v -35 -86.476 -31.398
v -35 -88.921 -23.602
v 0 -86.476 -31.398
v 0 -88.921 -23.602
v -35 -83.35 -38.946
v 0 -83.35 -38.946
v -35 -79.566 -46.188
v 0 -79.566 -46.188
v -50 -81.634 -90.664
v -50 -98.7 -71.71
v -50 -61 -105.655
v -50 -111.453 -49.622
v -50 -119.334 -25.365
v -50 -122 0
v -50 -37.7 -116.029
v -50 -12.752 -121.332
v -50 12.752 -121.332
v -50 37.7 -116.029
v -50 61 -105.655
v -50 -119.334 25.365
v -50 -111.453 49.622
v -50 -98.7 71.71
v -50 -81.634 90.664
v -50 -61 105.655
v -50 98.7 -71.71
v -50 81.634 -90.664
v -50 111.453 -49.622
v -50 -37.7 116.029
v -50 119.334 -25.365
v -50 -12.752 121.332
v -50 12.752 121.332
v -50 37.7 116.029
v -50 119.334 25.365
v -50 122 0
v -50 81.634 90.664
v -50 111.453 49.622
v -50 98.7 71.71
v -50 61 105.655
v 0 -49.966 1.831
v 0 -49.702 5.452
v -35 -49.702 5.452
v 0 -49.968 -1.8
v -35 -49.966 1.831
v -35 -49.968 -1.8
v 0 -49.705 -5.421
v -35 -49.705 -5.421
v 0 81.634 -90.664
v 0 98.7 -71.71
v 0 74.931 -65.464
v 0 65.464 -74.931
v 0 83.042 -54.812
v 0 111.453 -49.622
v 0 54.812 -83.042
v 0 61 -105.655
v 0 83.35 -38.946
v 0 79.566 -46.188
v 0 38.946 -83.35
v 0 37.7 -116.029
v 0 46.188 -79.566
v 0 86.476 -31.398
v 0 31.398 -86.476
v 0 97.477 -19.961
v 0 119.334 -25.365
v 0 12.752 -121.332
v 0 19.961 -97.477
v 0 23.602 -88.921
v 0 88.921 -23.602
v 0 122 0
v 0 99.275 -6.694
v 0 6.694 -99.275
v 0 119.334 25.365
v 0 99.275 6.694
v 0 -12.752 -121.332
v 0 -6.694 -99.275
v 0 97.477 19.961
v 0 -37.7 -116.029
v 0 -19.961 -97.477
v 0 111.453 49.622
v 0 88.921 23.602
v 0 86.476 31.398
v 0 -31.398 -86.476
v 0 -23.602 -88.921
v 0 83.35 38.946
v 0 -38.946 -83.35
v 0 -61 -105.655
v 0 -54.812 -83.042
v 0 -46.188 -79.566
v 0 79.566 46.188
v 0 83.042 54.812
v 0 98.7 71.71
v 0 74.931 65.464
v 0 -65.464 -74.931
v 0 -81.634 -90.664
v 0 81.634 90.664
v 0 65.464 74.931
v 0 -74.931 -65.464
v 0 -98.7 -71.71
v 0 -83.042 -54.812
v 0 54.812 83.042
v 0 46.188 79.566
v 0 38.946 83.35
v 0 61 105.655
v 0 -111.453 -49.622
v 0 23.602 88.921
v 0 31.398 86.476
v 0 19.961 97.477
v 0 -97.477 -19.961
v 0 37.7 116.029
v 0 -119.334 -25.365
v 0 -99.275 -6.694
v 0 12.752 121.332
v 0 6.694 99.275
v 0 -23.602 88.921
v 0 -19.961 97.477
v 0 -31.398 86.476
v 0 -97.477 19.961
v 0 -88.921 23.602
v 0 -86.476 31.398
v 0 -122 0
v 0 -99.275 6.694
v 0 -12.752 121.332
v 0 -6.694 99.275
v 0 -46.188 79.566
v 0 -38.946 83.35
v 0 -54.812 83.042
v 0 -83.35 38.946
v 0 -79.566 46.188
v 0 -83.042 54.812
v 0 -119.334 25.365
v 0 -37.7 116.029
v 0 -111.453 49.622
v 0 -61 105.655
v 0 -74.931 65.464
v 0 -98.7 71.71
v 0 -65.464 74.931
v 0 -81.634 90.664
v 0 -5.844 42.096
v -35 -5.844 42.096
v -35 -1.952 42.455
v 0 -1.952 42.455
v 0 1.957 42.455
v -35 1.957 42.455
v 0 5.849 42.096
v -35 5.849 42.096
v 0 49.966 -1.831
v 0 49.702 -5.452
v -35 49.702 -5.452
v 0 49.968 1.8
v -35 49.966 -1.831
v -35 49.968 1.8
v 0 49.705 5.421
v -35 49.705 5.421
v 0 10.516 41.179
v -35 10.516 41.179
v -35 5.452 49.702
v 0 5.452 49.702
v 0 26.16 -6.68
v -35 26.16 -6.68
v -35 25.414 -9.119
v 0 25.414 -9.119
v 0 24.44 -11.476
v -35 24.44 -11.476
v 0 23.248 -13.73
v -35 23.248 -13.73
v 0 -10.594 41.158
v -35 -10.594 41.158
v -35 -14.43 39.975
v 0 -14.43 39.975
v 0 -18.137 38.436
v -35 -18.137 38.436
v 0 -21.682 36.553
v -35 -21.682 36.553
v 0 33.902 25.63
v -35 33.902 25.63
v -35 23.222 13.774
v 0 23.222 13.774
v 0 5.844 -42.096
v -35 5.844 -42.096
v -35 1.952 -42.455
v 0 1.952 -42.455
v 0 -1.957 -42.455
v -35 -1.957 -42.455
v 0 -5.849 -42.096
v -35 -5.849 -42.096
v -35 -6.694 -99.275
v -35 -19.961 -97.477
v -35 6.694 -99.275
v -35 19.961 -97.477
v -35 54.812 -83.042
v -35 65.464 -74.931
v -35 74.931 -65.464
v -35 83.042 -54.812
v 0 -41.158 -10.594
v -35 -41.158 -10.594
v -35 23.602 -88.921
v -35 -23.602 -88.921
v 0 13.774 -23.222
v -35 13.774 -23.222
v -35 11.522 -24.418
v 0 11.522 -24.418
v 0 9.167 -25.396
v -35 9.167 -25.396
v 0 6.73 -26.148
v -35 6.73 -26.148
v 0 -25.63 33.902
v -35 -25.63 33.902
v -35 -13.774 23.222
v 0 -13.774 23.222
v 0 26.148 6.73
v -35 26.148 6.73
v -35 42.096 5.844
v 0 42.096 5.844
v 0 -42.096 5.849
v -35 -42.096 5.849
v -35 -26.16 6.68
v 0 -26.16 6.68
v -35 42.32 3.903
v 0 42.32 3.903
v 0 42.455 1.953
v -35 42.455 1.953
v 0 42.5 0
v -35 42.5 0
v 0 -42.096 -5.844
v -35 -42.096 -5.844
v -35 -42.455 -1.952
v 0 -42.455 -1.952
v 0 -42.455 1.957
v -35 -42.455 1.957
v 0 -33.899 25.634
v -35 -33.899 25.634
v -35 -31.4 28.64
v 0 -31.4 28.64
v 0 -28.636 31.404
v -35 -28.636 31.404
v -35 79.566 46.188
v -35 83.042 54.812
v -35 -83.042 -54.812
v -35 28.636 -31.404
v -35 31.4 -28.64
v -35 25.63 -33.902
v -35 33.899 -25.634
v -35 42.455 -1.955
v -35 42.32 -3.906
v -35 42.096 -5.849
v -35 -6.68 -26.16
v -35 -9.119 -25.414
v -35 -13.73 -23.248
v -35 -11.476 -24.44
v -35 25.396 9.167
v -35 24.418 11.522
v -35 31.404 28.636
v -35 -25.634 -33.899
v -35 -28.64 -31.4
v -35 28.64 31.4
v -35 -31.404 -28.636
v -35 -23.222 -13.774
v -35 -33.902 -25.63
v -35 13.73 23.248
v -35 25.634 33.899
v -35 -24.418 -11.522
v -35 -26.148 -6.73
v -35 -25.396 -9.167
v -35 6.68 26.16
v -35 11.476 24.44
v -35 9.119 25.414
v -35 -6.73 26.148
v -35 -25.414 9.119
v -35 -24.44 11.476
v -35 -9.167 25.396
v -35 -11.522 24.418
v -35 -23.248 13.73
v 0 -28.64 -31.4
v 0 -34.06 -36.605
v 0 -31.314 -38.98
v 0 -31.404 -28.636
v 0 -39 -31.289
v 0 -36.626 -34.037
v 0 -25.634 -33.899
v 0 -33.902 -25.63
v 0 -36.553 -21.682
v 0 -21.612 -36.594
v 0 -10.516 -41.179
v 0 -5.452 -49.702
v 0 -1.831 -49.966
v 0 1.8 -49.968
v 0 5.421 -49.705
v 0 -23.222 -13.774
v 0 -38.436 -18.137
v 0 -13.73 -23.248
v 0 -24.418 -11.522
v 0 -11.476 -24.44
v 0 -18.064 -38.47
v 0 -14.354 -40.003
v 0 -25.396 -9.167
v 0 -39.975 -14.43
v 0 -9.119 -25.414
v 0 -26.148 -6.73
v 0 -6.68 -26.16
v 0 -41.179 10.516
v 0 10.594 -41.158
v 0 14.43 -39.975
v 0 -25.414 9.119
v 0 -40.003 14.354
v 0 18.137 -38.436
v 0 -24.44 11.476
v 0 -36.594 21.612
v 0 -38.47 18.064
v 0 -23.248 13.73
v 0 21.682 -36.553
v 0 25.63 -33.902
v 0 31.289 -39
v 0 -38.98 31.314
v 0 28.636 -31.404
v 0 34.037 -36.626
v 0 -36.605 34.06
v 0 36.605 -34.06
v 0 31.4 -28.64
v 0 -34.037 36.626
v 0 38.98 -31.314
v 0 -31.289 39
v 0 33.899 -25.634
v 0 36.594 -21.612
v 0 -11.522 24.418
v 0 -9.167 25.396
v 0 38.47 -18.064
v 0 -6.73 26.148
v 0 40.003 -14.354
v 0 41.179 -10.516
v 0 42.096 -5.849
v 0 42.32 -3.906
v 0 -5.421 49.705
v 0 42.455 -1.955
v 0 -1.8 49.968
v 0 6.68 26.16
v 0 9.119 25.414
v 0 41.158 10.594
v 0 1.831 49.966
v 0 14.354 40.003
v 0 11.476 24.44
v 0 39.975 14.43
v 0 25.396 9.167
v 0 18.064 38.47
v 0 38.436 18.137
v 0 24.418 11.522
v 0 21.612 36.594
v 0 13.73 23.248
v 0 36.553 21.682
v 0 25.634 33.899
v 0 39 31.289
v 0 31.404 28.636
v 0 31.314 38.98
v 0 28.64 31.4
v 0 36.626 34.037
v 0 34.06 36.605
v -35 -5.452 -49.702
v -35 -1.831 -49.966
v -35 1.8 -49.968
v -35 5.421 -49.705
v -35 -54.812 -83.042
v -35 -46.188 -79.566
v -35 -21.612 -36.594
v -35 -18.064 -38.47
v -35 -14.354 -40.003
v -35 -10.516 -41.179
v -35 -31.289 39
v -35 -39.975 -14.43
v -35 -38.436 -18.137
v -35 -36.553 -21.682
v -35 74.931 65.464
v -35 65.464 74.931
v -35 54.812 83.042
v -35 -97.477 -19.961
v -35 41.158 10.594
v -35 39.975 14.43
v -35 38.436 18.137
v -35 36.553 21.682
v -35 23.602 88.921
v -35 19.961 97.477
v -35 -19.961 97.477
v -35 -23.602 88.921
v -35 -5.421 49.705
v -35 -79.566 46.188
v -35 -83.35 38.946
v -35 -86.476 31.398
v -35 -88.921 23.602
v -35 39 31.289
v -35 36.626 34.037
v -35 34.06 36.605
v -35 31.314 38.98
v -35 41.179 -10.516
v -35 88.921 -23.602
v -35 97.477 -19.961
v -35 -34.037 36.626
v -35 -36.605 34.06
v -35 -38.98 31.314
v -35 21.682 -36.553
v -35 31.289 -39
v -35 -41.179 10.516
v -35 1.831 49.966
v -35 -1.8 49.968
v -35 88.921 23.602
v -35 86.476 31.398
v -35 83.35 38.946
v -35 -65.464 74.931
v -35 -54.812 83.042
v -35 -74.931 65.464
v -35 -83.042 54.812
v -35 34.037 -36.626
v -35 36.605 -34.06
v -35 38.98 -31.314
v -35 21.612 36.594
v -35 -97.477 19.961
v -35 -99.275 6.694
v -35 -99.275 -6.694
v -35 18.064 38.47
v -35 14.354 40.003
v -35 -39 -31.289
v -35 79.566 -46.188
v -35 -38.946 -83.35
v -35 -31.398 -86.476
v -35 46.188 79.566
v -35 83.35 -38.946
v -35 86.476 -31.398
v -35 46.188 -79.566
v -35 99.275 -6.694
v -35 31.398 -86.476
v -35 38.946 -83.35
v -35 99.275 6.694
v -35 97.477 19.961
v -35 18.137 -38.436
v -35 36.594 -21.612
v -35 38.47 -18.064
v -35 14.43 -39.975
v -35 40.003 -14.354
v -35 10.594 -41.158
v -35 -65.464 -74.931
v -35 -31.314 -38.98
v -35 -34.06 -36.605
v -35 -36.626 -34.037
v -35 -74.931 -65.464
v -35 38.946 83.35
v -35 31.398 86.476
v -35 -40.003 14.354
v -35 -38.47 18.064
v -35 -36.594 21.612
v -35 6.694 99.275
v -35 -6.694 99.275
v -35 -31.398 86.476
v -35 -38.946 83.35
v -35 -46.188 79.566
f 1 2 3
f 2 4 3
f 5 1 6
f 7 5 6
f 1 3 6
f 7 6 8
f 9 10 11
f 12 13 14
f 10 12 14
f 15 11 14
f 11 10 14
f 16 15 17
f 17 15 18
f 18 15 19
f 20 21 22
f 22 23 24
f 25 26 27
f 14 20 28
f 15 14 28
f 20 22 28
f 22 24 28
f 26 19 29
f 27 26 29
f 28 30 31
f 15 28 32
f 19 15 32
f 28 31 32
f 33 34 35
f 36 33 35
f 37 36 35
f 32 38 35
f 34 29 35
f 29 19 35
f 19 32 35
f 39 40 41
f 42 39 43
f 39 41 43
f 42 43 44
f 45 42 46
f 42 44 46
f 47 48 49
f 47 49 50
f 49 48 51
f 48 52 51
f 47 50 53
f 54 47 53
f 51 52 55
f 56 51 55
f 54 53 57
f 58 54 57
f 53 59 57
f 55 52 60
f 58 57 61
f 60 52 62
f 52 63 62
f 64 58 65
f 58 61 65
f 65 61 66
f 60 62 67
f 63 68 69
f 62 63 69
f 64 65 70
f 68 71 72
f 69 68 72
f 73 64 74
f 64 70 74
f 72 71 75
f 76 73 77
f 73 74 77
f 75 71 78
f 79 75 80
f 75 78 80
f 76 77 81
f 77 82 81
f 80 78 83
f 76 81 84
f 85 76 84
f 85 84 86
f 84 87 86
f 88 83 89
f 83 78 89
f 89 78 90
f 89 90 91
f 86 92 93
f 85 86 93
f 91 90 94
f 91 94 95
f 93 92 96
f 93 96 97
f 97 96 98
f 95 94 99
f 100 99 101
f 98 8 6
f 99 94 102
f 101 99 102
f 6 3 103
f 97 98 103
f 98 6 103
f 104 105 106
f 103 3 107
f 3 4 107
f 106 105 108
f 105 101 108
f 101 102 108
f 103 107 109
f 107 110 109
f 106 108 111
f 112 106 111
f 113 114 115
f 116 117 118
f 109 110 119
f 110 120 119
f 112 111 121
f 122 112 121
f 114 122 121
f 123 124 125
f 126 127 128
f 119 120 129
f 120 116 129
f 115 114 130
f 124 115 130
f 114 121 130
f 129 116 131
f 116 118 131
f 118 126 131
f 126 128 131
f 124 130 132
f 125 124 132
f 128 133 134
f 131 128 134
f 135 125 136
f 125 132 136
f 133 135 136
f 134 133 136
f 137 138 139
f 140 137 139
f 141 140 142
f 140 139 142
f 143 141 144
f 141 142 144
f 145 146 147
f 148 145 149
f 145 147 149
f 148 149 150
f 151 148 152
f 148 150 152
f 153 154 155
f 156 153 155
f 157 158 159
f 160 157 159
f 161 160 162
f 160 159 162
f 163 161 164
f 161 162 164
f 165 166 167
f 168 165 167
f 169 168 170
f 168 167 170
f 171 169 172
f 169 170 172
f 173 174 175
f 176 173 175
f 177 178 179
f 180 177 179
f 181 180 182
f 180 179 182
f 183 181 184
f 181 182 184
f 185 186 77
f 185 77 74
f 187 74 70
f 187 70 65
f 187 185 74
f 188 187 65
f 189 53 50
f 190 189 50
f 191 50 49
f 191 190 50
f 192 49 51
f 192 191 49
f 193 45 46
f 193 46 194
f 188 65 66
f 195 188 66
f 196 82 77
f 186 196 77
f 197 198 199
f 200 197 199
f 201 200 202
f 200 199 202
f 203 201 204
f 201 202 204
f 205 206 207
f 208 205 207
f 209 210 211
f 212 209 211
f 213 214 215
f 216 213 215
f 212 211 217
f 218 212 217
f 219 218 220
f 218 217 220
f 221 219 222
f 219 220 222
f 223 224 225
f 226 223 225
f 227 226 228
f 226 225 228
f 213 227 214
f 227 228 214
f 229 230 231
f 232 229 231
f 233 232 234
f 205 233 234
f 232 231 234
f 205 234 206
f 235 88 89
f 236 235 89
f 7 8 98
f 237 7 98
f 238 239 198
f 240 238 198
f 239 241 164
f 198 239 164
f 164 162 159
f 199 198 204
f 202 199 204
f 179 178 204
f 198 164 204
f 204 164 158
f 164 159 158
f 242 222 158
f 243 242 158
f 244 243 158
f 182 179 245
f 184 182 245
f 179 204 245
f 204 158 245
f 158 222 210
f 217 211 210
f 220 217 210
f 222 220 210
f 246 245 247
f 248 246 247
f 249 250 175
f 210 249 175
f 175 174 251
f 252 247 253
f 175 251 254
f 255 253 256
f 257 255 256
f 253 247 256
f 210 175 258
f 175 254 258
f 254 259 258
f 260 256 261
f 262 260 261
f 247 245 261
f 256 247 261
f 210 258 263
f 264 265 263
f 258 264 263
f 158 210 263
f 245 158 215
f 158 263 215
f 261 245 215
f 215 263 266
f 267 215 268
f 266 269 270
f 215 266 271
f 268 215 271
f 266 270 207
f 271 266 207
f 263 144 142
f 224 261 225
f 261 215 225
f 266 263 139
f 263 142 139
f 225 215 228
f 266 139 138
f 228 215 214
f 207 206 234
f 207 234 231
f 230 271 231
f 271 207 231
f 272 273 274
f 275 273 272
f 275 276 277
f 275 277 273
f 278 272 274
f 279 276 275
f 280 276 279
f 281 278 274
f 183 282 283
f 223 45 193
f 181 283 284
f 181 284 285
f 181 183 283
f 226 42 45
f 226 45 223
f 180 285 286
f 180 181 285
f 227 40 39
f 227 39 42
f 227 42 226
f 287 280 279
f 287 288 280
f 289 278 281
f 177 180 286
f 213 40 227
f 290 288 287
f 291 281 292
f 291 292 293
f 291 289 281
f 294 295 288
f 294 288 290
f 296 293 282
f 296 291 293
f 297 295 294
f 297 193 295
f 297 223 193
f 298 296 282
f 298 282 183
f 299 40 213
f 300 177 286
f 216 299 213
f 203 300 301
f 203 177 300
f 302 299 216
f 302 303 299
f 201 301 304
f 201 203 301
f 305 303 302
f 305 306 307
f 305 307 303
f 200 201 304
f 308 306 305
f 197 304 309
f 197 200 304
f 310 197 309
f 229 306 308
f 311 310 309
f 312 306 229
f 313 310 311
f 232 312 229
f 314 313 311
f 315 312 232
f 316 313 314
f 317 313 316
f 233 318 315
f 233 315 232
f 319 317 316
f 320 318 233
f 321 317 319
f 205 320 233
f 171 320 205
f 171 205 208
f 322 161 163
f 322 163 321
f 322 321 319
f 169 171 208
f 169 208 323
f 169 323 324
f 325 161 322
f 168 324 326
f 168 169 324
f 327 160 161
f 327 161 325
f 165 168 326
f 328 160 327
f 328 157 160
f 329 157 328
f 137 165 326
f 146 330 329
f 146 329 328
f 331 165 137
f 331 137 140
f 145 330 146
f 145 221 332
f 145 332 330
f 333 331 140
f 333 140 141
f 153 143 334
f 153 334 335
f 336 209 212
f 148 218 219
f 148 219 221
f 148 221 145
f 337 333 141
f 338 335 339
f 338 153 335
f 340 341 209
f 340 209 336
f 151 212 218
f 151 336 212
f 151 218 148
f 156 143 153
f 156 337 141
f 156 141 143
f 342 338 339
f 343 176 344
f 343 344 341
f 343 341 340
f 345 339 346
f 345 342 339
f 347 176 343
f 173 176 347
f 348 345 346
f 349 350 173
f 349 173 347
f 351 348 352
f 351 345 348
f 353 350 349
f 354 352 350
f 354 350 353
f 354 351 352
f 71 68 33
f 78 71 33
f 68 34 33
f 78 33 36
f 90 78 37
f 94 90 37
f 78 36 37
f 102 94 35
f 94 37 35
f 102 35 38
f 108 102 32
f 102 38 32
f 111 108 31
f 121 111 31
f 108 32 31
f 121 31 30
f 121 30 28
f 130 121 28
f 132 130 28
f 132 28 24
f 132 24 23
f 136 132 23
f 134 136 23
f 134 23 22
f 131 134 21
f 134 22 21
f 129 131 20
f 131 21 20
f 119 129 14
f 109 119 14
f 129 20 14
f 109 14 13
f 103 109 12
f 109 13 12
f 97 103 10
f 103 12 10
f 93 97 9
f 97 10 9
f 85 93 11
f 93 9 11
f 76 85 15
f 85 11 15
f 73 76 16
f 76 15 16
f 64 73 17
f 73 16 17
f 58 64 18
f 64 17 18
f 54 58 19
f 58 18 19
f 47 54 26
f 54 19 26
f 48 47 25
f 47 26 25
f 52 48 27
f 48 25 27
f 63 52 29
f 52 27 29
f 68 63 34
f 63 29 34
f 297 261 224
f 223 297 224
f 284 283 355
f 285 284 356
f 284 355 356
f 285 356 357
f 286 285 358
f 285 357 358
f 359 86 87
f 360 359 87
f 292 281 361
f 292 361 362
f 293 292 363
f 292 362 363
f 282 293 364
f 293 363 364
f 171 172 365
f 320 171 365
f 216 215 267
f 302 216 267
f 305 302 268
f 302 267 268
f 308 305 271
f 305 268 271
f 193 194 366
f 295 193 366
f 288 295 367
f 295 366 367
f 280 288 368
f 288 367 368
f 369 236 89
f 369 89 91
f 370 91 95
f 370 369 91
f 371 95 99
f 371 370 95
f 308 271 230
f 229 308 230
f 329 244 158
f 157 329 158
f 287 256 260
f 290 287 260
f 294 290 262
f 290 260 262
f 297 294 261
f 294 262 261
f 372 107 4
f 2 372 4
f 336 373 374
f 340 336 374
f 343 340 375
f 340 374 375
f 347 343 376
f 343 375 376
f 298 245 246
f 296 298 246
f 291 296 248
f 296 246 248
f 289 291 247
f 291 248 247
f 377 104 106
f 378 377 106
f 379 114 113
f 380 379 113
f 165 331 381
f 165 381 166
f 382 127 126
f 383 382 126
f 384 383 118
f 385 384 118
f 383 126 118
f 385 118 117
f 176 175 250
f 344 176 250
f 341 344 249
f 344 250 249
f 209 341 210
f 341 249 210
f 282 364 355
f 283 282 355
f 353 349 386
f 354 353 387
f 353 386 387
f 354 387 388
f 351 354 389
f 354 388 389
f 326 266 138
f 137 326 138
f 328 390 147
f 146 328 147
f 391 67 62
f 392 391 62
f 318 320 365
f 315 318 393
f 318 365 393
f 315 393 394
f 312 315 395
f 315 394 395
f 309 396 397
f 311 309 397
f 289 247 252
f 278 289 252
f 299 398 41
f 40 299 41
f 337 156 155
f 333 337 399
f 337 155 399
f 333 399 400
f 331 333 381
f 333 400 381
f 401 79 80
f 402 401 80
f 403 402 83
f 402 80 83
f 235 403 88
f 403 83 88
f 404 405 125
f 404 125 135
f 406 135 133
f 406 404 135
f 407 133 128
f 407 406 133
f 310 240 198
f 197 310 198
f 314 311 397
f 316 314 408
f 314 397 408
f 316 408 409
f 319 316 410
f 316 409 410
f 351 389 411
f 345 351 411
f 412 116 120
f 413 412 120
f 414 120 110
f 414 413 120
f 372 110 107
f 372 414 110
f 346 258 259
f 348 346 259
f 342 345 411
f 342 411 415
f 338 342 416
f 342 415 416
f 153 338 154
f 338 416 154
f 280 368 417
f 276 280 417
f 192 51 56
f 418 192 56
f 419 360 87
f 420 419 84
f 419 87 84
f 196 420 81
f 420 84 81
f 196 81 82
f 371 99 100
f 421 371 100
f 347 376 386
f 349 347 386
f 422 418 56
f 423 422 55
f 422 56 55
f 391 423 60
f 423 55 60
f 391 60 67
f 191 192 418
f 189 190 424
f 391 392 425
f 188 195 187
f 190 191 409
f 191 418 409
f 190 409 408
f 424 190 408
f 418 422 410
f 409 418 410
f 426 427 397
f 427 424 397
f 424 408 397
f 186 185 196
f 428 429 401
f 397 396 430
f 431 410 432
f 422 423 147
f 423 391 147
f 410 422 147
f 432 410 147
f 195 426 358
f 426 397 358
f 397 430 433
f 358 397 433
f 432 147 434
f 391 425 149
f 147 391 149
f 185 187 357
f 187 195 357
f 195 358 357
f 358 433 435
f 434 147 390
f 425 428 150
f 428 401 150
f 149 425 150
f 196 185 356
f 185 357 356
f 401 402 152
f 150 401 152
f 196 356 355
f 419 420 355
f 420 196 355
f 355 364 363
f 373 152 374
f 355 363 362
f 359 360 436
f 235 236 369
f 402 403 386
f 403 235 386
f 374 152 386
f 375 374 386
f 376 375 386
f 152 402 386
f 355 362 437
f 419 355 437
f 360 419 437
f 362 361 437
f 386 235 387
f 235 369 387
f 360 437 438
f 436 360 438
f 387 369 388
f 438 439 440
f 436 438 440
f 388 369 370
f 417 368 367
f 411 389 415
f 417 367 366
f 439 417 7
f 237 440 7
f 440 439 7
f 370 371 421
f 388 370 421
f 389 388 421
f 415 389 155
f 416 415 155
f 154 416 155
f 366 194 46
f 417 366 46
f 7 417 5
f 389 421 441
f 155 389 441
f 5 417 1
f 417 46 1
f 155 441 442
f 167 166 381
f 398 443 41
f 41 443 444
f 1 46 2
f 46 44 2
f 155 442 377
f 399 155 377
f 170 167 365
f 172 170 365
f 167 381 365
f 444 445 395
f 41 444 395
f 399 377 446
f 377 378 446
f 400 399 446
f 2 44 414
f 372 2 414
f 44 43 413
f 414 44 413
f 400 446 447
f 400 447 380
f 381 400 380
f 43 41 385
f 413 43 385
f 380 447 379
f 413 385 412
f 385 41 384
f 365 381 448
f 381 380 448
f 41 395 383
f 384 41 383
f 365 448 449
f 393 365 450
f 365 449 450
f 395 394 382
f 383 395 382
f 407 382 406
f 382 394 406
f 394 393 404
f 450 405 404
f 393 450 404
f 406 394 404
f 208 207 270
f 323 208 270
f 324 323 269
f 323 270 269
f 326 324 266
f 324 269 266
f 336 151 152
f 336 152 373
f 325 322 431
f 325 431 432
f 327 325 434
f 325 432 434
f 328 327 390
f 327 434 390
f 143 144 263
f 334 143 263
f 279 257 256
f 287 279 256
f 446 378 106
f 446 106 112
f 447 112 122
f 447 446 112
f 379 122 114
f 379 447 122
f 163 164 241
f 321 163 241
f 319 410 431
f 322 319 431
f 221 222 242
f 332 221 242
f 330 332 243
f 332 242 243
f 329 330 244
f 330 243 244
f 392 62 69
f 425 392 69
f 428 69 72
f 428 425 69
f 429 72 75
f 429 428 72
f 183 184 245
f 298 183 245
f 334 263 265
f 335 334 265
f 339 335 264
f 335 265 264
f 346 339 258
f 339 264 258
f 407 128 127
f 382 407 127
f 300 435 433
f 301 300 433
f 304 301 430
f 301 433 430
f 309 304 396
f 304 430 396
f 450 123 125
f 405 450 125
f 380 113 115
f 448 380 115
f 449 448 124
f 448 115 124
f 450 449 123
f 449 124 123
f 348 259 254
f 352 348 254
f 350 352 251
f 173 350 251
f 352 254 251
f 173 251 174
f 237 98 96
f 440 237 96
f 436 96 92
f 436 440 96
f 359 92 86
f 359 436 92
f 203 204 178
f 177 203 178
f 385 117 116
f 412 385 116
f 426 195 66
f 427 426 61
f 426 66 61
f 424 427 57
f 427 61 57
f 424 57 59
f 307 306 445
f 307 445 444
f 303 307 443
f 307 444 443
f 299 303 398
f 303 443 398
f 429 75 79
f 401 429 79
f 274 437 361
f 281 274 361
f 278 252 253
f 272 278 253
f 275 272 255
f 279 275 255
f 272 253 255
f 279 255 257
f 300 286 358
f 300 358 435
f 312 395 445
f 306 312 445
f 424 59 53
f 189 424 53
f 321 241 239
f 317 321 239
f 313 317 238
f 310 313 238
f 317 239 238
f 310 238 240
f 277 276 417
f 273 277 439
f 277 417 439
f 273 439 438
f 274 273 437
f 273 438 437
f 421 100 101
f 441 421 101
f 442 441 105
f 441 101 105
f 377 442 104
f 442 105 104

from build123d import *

# Parameters (mm, degrees)
F3_DEPTH = 35
F6_DEPTH = 35
F7_R     = 116.5
F7_R_2   = 99.5
F8_DEPTH = 35


# Not quite as in the source:
# - a feature names something its author has since deleted; it is built from what else it names


with BuildPart() as f1:
    # F0 (on Top) → F1 (revolve)
    with BuildSketch(Plane.XY):
        Polygon((-35, 92), (0, 92), (0, 122), (-50, 122), (-50, 0), (-35, 0), align=None)
    revolve(axis=Axis((-42.5, 0, 0), (1, 0, 0)))

    # F2 (on face) → F3 (cut)
    with BuildSketch(Plane.YZ):
        with BuildLine():
            ThreePointArc((-23.6019687167, 88.9210159225), (0, 92), (23.6019687167, 88.9210159225))
            Line((23.6019687167, 88.9210159225), (19.9614730536, 97.4771234369))
            ThreePointArc((19.9614730536, 97.4771234369), (0, 99.5), (-19.9614730536, 97.4771234369))
            Line((-19.9614730536, 97.4771234369), (-23.6019687167, 88.9210159225))
        make_face()
        with BuildLine():
            ThreePointArc((-19.9614730536, 97.4771234369), (0, 99.5), (19.9614730536, 97.4771234369))
            Line((19.9614730536, 97.4771234369), (12.8102793756, 114.2842803815))
            ThreePointArc((12.8102793756, 114.2842803815), (0, 115), (-12.8102793756, 114.2842803815))
            Line((-12.8102793756, 114.2842803815), (-19.9614730536, 97.4771234369))
        make_face()
        with BuildLine():
            ThreePointArc((-79.5657654778, 46.1875412199), (-65.0538238692, 65.0538238692), (-46.1875412199, 79.5657654778))
            Line((-46.1875412199, 79.5657654778), (-54.8118420341, 83.0416279515))
            ThreePointArc((-54.8118420341, 83.0416279515), (-70.3571247281, 70.3571247281), (-83.0416279515, 54.8118420341))
            Line((-83.0416279515, 54.8118420341), (-79.5657654778, 46.1875412199))
        make_face()
        with BuildLine():
            ThreePointArc((-83.0416279515, 54.8118420341), (-70.3571247281, 70.3571247281), (-54.8118420341, 83.0416279515))
            Line((-54.8118420341, 83.0416279515), (-71.7529542254, 89.8694250562))
            ThreePointArc((-71.7529542254, 89.8694250562), (-81.3172798365, 81.3172798365), (-89.8694250562, 71.7529542254))
            Line((-89.8694250562, 71.7529542254), (-83.0416279515, 54.8118420341))
        make_face()
        with BuildLine():
            ThreePointArc((-88.9210159225, -23.6019687167), (-92, 0), (-88.9210159225, 23.6019687167))
            Line((-88.9210159225, 23.6019687167), (-97.4771234369, 19.9614730536))
            ThreePointArc((-97.4771234369, 19.9614730536), (-99.5, 0), (-97.4771234369, -19.9614730536))
            Line((-97.4771234369, -19.9614730536), (-88.9210159225, -23.6019687167))
        make_face()
        with BuildLine():
            ThreePointArc((-97.4771234369, -19.9614730536), (-99.5, 0), (-97.4771234369, 19.9614730536))
            Line((-97.4771234369, 19.9614730536), (-114.2842803815, 12.8102793756))
            ThreePointArc((-114.2842803815, 12.8102793756), (-115, 0), (-114.2842803815, -12.8102793756))
            Line((-114.2842803815, -12.8102793756), (-97.4771234369, -19.9614730536))
        make_face()
        with BuildLine():
            ThreePointArc((-46.1875412199, -79.5657654778), (-65.0538238692, -65.0538238692), (-79.5657654778, -46.1875412199))
            Line((-79.5657654778, -46.1875412199), (-83.0416279515, -54.8118420341))
            ThreePointArc((-83.0416279515, -54.8118420341), (-70.3571247281, -70.3571247281), (-54.8118420341, -83.0416279515))
            Line((-54.8118420341, -83.0416279515), (-46.1875412199, -79.5657654778))
        make_face()
        with BuildLine():
            ThreePointArc((-54.8118420341, -83.0416279515), (-70.3571247281, -70.3571247281), (-83.0416279515, -54.8118420341))
            Line((-83.0416279515, -54.8118420341), (-89.8694250562, -71.7529542254))
            ThreePointArc((-89.8694250562, -71.7529542254), (-81.3172798365, -81.3172798365), (-71.7529542254, -89.8694250562))
            Line((-71.7529542254, -89.8694250562), (-54.8118420341, -83.0416279515))
        make_face()
        with BuildLine():
            Line((19.9614730536, -97.4771234369), (23.6019687167, -88.9210159225))
            ThreePointArc((23.6019687167, -88.9210159225), (0, -92), (-23.6019687167, -88.9210159225))
            Line((-23.6019687167, -88.9210159225), (-19.9614730536, -97.4771234369))
            ThreePointArc((-19.9614730536, -97.4771234369), (0, -99.5), (19.9614730536, -97.4771234369))
        make_face()
        with BuildLine():
            Line((12.8102793756, -114.2842803815), (19.9614730536, -97.4771234369))
            ThreePointArc((19.9614730536, -97.4771234369), (0, -99.5), (-19.9614730536, -97.4771234369))
            Line((-19.9614730536, -97.4771234369), (-12.8102793756, -114.2842803815))
            ThreePointArc((-12.8102793756, -114.2842803815), (0, -115), (12.8102793756, -114.2842803815))
        make_face()
        with BuildLine():
            Line((83.0416279515, -54.8118420341), (79.5657654778, -46.1875412199))
            ThreePointArc((79.5657654778, -46.1875412199), (65.0538238692, -65.0538238692), (46.1875412199, -79.5657654778))
            Line((46.1875412199, -79.5657654778), (54.8118420341, -83.0416279515))
            ThreePointArc((54.8118420341, -83.0416279515), (70.3571247281, -70.3571247281), (83.0416279515, -54.8118420341))
        make_face()
        with BuildLine():
            Line((89.8694250562, -71.7529542254), (83.0416279515, -54.8118420341))
            ThreePointArc((83.0416279515, -54.8118420341), (70.3571247281, -70.3571247281), (54.8118420341, -83.0416279515))
            Line((54.8118420341, -83.0416279515), (71.7529542254, -89.8694250562))
            ThreePointArc((71.7529542254, -89.8694250562), (81.3172798365, -81.3172798365), (89.8694250562, -71.7529542254))
        make_face()
        with BuildLine():
            Line((97.4771234369, 19.9614730536), (88.9210159225, 23.6019687167))
            ThreePointArc((88.9210159225, 23.6019687167), (91.2270065958, 11.9009775886), (92, 0))
            ThreePointArc((92, 0), (91.2270065958, -11.9009775886), (88.9210159225, -23.6019687167))
            Line((88.9210159225, -23.6019687167), (97.4771234369, -19.9614730536))
            ThreePointArc((97.4771234369, -19.9614730536), (98.9929891002, -10.0318547146), (99.5, 0))
            ThreePointArc((99.5, 0), (98.9929891002, 10.0318547146), (97.4771234369, 19.9614730536))
        make_face()
        with BuildLine():
            Line((114.2842803815, 12.8102793756), (97.4771234369, 19.9614730536))
            ThreePointArc((97.4771234369, 19.9614730536), (98.9929891002, 10.0318547146), (99.5, 0))
            ThreePointArc((99.5, 0), (98.9929891002, -10.0318547146), (97.4771234369, -19.9614730536))
            Line((97.4771234369, -19.9614730536), (114.2842803815, -12.8102793756))
            ThreePointArc((114.2842803815, -12.8102793756), (115, 0), (114.2842803815, 12.8102793756))
        make_face()
        with BuildLine():
            Line((54.8118420341, 83.0416279515), (46.1875412199, 79.5657654778))
            ThreePointArc((46.1875412199, 79.5657654778), (65.0538238692, 65.0538238692), (79.5657654778, 46.1875412199))
            Line((79.5657654778, 46.1875412199), (83.0416279515, 54.8118420341))
            ThreePointArc((83.0416279515, 54.8118420341), (70.3571247281, 70.3571247281), (54.8118420341, 83.0416279515))
        make_face()
        with BuildLine():
            Line((71.7529542254, 89.8694250562), (54.8118420341, 83.0416279515))
            ThreePointArc((54.8118420341, 83.0416279515), (70.3571247281, 70.3571247281), (83.0416279515, 54.8118420341))
            Line((83.0416279515, 54.8118420341), (89.8694250562, 71.7529542254))
            ThreePointArc((89.8694250562, 71.7529542254), (81.3172798365, 81.3172798365), (71.7529542254, 89.8694250562))
        make_face()
    extrude(amount=-F3_DEPTH, mode=Mode.SUBTRACT)

    # F5 (on face) → F6 (join)
    with BuildSketch(Plane.YZ.offset(-35)):
        with BuildLine():
            Line((5.8489450002, 42.0956035992), (5.452030419, 49.7018647971))
            ThreePointArc((5.452030419, 49.7018647971), (0.0155501533, 49.9999975819), (-5.4211145011, 49.7052463787))
            Line((-5.4211145011, 49.7052463787), (-5.8439419576, 42.0962984406))
            ThreePointArc((-5.8439419576, 42.0962984406), (0.0025255316, 42.499999925), (5.8489450002, 42.0956035992))
        make_face()
        with BuildLine():
            Line((10.5155718212, 41.1785471972), (5.452030419, 49.7018647971))
            Line((5.452030419, 49.7018647971), (5.8489450002, 42.0956035992))
            ThreePointArc((5.8489450002, 42.0956035992), (8.1950961441, 41.7024027987), (10.5155718212, 41.1785471972))
        make_face()
        with BuildLine():
            Line((-5.8439419576, 42.0962984406), (-5.4211145011, 49.7052463787))
            Line((-5.4211145011, 49.7052463787), (-10.5938325524, 41.1584828663))
            ThreePointArc((-10.5938325524, 41.1584828663), (-8.2322525607, 41.6950838562), (-5.8439419576, 42.0962984406))
        make_face()
        with BuildLine():
            ThreePointArc((10.5155718212, 41.1785471972), (8.1950961441, 41.7024027987), (5.8489450002, 42.0956035992))
            Line((5.8489450002, 42.0956035992), (6.6804809217, 26.1604888076))
            ThreePointArc((6.6804809217, 26.1604888076), (10.3087382214, 24.9545570244), (13.7302760127, 23.2482154286))
            Line((13.7302760127, 23.2482154286), (25.6342871031, 33.8988690772))
            ThreePointArc((25.6342871031, 33.8988690772), (23.6617949268, 35.303958147), (21.6124715015, 36.5944131746))
            ThreePointArc((21.6124715015, 36.5944131746), (16.2267175708, 39.2803212421), (10.5155718212, 41.1785471972))
        make_face()
        with BuildLine():
            Line((-6.7301995039, 26.1477420562), (-5.8439419576, 42.0962984406))
            ThreePointArc((-5.8439419576, 42.0962984406), (-8.2322525607, 41.6950838562), (-10.5938325524, 41.1584828663))
            ThreePointArc((-10.5938325524, 41.1584828663), (-16.3013594868, 39.2494035481), (-21.6819978197, 36.5532621054))
            ThreePointArc((-21.6819978197, 36.5532621054), (-23.6932437548, 35.2828598667), (-25.6302580907, 33.9019154356))
            Line((-25.6302580907, 33.9019154356), (-13.7744456737, 23.2220723964))
            ThreePointArc((-13.7744456737, 23.2220723964), (-10.3561577916, 24.9349151953), (-6.7301995039, 26.1477420562))
        make_face()
        with BuildLine():
            Line((31.3136099496, 38.9802236003), (21.6124715015, 36.5944131746))
            ThreePointArc((21.6124715015, 36.5944131746), (23.6617949268, 35.303958147), (25.6342871031, 33.8988690772))
            Line((25.6342871031, 33.8988690772), (31.3136099496, 38.9802236003))
        make_face()
        with BuildLine():
            ThreePointArc((-25.6302580907, 33.9019154356), (-23.6932437548, 35.2828598667), (-21.6819978197, 36.5532621054))
            Line((-21.6819978197, 36.5532621054), (-31.2893579551, 38.9996933162))
            Line((-31.2893579551, 38.9996933162), (-25.6302580907, 33.9019154356))
        make_face()
        with BuildLine():
            Line((31.3136099496, 38.9802236003), (25.6342871031, 33.8988690772))
            ThreePointArc((25.6342871031, 33.8988690772), (30.0538239679, 30.0502523268), (33.9019154356, 25.6302580907))
            Line((33.9019154356, 25.6302580907), (38.9996933162, 31.2893579551))
            ThreePointArc((38.9996933162, 31.2893579551), (35.3663329683, 35.3443417306), (31.3136099496, 38.9802236003))
        make_face()
        with BuildLine():
            ThreePointArc((-33.8988690772, 25.6342871031), (-30.0502523268, 30.0538239679), (-25.6302580907, 33.9019154356))
            Line((-25.6302580907, 33.9019154356), (-31.2893579551, 38.9996933162))
            ThreePointArc((-31.2893579551, 38.9996933162), (-35.3443417306, 35.3663329683), (-38.9802236003, 31.3136099496))
            Line((-38.9802236003, 31.3136099496), (-33.8988690772, 25.6342871031))
        make_face()
        with BuildLine():
            Line((33.9019154356, 25.6302580907), (23.2220723964, 13.7744456737))
            ThreePointArc((23.2220723964, 13.7744456737), (24.9349151953, 10.3561577916), (26.1477420562, 6.7301995039))
            Line((26.1477420562, 6.7301995039), (42.0962984406, 5.8439419576))
            ThreePointArc((42.0962984406, 5.8439419576), (41.6950838562, 8.2322525607), (41.1584828663, 10.5938325524))
            ThreePointArc((41.1584828663, 10.5938325524), (39.2494035481, 16.3013594868), (36.5532621054, 21.6819978197))
            ThreePointArc((36.5532621054, 21.6819978197), (35.2828598667, 23.6932437548), (33.9019154356, 25.6302580907))
        make_face()
        with BuildLine():
            Line((38.9996933162, 31.2893579551), (33.9019154356, 25.6302580907))
            ThreePointArc((33.9019154356, 25.6302580907), (35.2828598667, 23.6932437548), (36.5532621054, 21.6819978197))
            Line((36.5532621054, 21.6819978197), (38.9996933162, 31.2893579551))
        make_face()
        with BuildLine():
            ThreePointArc((-26.1604888076, 6.6804809217), (-24.9545570244, 10.3087382214), (-23.2482154286, 13.7302760127))
            Line((-23.2482154286, 13.7302760127), (-33.8988690772, 25.6342871031))
            ThreePointArc((-33.8988690772, 25.6342871031), (-35.303958147, 23.6617949268), (-36.5944131746, 21.6124715015))
            ThreePointArc((-36.5944131746, 21.6124715015), (-39.2803212421, 16.2267175708), (-41.1785471972, 10.5155718212))
            ThreePointArc((-41.1785471972, 10.5155718212), (-41.7024027987, 8.1950961441), (-42.0956035992, 5.8489450002))
            Line((-42.0956035992, 5.8489450002), (-26.1604888076, 6.6804809217))
        make_face()
        with BuildLine():
            ThreePointArc((-36.5944131746, 21.6124715015), (-35.303958147, 23.6617949268), (-33.8988690772, 25.6342871031))
            Line((-33.8988690772, 25.6342871031), (-38.9802236003, 31.3136099496))
            Line((-38.9802236003, 31.3136099496), (-36.5944131746, 21.6124715015))
        make_face()
        with BuildLine():
            ThreePointArc((41.1584828663, 10.5938325524), (41.6950838562, 8.2322525607), (42.0962984406, 5.8439419576))
            Line((42.0962984406, 5.8439419576), (49.7052463787, 5.4211145011))
            Line((49.7052463787, 5.4211145011), (41.1584828663, 10.5938325524))
        make_face()
        with BuildLine():
            Line((49.7052463787, 5.4211145011), (42.0962984406, 5.8439419576))
            ThreePointArc((42.0962984406, 5.8439419576), (42.3989544902, 2.9289346422), (42.5, 0))
            ThreePointArc((42.5, 0), (42.3987803655, -2.9314541641), (42.0956035992, -5.8489450002))
            Line((42.0956035992, -5.8489450002), (49.7018647971, -5.452030419))
            ThreePointArc((49.7018647971, -5.452030419), (49.9999975819, -0.0155501533), (49.7052463787, 5.4211145011))
        make_face()
        with BuildLine():
            ThreePointArc((-23.2220723964, -13.7744456737), (-24.9349151953, -10.3561577916), (-26.1477420562, -6.7301995039))
            Line((-26.1477420562, -6.7301995039), (-42.0962984406, -5.8439419576))
            ThreePointArc((-42.0962984406, -5.8439419576), (-41.6950838562, -8.2322525607), (-41.1584828663, -10.5938325524))
            ThreePointArc((-41.1584828663, -10.5938325524), (-39.2494035481, -16.3013594868), (-36.5532621054, -21.6819978197))
            ThreePointArc((-36.5532621054, -21.6819978197), (-35.2828598667, -23.6932437548), (-33.9019154356, -25.6302580907))
            Line((-33.9019154356, -25.6302580907), (-23.2220723964, -13.7744456737))
        make_face()
        with BuildLine():
            ThreePointArc((-42.0962984406, -5.8439419576), (-42.499999925, 0.0025255316), (-42.0956035992, 5.8489450002))
            Line((-42.0956035992, 5.8489450002), (-49.7018647971, 5.452030419))
            ThreePointArc((-49.7018647971, 5.452030419), (-49.9999975819, 0.0155501533), (-49.7052463787, -5.4211145011))
            Line((-49.7052463787, -5.4211145011), (-42.0962984406, -5.8439419576))
        make_face()
        with BuildLine():
            Line((-49.7018647971, 5.452030419), (-42.0956035992, 5.8489450002))
            ThreePointArc((-42.0956035992, 5.8489450002), (-41.7024027987, 8.1950961441), (-41.1785471972, 10.5155718212))
            Line((-41.1785471972, 10.5155718212), (-49.7018647971, 5.452030419))
        make_face()
        with BuildLine():
            Line((42.0956035992, -5.8489450002), (26.1604888076, -6.6804809217))
            ThreePointArc((26.1604888076, -6.6804809217), (24.9545570244, -10.3087382214), (23.2482154286, -13.7302760127))
            Line((23.2482154286, -13.7302760127), (33.8988690772, -25.6342871031))
            ThreePointArc((33.8988690772, -25.6342871031), (35.303958147, -23.6617949268), (36.5944131746, -21.6124715015))
            ThreePointArc((36.5944131746, -21.6124715015), (39.2803212421, -16.2267175708), (41.1785471972, -10.5155718212))
            ThreePointArc((41.1785471972, -10.5155718212), (41.7024027987, -8.1950961441), (42.0956035992, -5.8489450002))
        make_face()
        with BuildLine():
            ThreePointArc((-41.1584828663, -10.5938325524), (-41.6950838562, -8.2322525607), (-42.0962984406, -5.8439419576))
            Line((-42.0962984406, -5.8439419576), (-49.7052463787, -5.4211145011))
            Line((-49.7052463787, -5.4211145011), (-41.1584828663, -10.5938325524))
        make_face()
        with BuildLine():
            Line((49.7018647971, -5.452030419), (42.0956035992, -5.8489450002))
            ThreePointArc((42.0956035992, -5.8489450002), (41.7024027987, -8.1950961441), (41.1785471972, -10.5155718212))
            Line((41.1785471972, -10.5155718212), (49.7018647971, -5.452030419))
        make_face()
        with BuildLine():
            ThreePointArc((-6.6804809217, -26.1604888076), (-10.3087382214, -24.9545570244), (-13.7302760127, -23.2482154286))
            Line((-13.7302760127, -23.2482154286), (-25.6342871031, -33.8988690772))
            ThreePointArc((-25.6342871031, -33.8988690772), (-23.6617949268, -35.303958147), (-21.6124715015, -36.5944131746))
            ThreePointArc((-21.6124715015, -36.5944131746), (-16.2267175708, -39.2803212421), (-10.5155718212, -41.1785471972))
            ThreePointArc((-10.5155718212, -41.1785471972), (-8.1950961441, -41.7024027987), (-5.8489450002, -42.0956035992))
            Line((-5.8489450002, -42.0956035992), (-6.6804809217, -26.1604888076))
        make_face()
        with BuildLine():
            ThreePointArc((-25.6342871031, -33.8988690772), (-30.0538239679, -30.0502523268), (-33.9019154356, -25.6302580907))
            Line((-33.9019154356, -25.6302580907), (-38.9996933162, -31.2893579551))
            ThreePointArc((-38.9996933162, -31.2893579551), (-35.3663329683, -35.3443417306), (-31.3136099496, -38.9802236003))
            Line((-31.3136099496, -38.9802236003), (-25.6342871031, -33.8988690772))
        make_face()
        with BuildLine():
            Line((-38.9996933162, -31.2893579551), (-33.9019154356, -25.6302580907))
            ThreePointArc((-33.9019154356, -25.6302580907), (-35.2828598667, -23.6932437548), (-36.5532621054, -21.6819978197))
            Line((-36.5532621054, -21.6819978197), (-38.9996933162, -31.2893579551))
        make_face()
        with BuildLine():
            Line((25.6302580907, -33.9019154356), (13.7744456737, -23.2220723964))
            ThreePointArc((13.7744456737, -23.2220723964), (10.3561577916, -24.9349151953), (6.7301995039, -26.1477420562))
            Line((6.7301995039, -26.1477420562), (5.8439419576, -42.0962984406))
            ThreePointArc((5.8439419576, -42.0962984406), (8.2322525607, -41.6950838562), (10.5938325524, -41.1584828663))
            ThreePointArc((10.5938325524, -41.1584828663), (16.3013594868, -39.2494035481), (21.6819978197, -36.5532621054))
            ThreePointArc((21.6819978197, -36.5532621054), (23.6932437548, -35.2828598667), (25.6302580907, -33.9019154356))
        make_face()
        with BuildLine():
            ThreePointArc((36.5944131746, -21.6124715015), (35.303958147, -23.6617949268), (33.8988690772, -25.6342871031))
            Line((33.8988690772, -25.6342871031), (38.9802236003, -31.3136099496))
            Line((38.9802236003, -31.3136099496), (36.5944131746, -21.6124715015))
        make_face()
        with BuildLine():
            Line((38.9802236003, -31.3136099496), (33.8988690772, -25.6342871031))
            ThreePointArc((33.8988690772, -25.6342871031), (30.0502523268, -30.0538239679), (25.6302580907, -33.9019154356))
            Line((25.6302580907, -33.9019154356), (31.2893579551, -38.9996933162))
            ThreePointArc((31.2893579551, -38.9996933162), (35.3443417306, -35.3663329683), (38.9802236003, -31.3136099496))
        make_face()
        with BuildLine():
            ThreePointArc((-21.6124715015, -36.5944131746), (-23.6617949268, -35.303958147), (-25.6342871031, -33.8988690772))
            Line((-25.6342871031, -33.8988690772), (-31.3136099496, -38.9802236003))
            Line((-31.3136099496, -38.9802236003), (-21.6124715015, -36.5944131746))
        make_face()
        with BuildLine():
            Line((31.2893579551, -38.9996933162), (25.6302580907, -33.9019154356))
            ThreePointArc((25.6302580907, -33.9019154356), (23.6932437548, -35.2828598667), (21.6819978197, -36.5532621054))
            Line((21.6819978197, -36.5532621054), (31.2893579551, -38.9996933162))
        make_face()
        with BuildLine():
            ThreePointArc((5.8439419576, -42.0962984406), (-0.0025255316, -42.499999925), (-5.8489450002, -42.0956035992))
            Line((-5.8489450002, -42.0956035992), (-5.452030419, -49.7018647971))
            ThreePointArc((-5.452030419, -49.7018647971), (-0.0155501533, -49.9999975819), (5.4211145011, -49.7052463787))
            Line((5.4211145011, -49.7052463787), (5.8439419576, -42.0962984406))
        make_face()
        with BuildLine():
            Line((-5.452030419, -49.7018647971), (-5.8489450002, -42.0956035992))
            ThreePointArc((-5.8489450002, -42.0956035992), (-8.1950961441, -41.7024027987), (-10.5155718212, -41.1785471972))
            Line((-10.5155718212, -41.1785471972), (-5.452030419, -49.7018647971))
        make_face()
        with BuildLine():
            ThreePointArc((10.5938325524, -41.1584828663), (8.2322525607, -41.6950838562), (5.8439419576, -42.0962984406))
            Line((5.8439419576, -42.0962984406), (5.4211145011, -49.7052463787))
            Line((5.4211145011, -49.7052463787), (10.5938325524, -41.1584828663))
        make_face()
    extrude(amount=F6_DEPTH)

    # F7 (on face) → F8 (join)
    with BuildSketch(Plane.YZ.offset(-35)):
        Circle(F7_R)
        Circle(F7_R_2, mode=Mode.SUBTRACT)
    extrude(amount=F8_DEPTH)


solid = f1.part
